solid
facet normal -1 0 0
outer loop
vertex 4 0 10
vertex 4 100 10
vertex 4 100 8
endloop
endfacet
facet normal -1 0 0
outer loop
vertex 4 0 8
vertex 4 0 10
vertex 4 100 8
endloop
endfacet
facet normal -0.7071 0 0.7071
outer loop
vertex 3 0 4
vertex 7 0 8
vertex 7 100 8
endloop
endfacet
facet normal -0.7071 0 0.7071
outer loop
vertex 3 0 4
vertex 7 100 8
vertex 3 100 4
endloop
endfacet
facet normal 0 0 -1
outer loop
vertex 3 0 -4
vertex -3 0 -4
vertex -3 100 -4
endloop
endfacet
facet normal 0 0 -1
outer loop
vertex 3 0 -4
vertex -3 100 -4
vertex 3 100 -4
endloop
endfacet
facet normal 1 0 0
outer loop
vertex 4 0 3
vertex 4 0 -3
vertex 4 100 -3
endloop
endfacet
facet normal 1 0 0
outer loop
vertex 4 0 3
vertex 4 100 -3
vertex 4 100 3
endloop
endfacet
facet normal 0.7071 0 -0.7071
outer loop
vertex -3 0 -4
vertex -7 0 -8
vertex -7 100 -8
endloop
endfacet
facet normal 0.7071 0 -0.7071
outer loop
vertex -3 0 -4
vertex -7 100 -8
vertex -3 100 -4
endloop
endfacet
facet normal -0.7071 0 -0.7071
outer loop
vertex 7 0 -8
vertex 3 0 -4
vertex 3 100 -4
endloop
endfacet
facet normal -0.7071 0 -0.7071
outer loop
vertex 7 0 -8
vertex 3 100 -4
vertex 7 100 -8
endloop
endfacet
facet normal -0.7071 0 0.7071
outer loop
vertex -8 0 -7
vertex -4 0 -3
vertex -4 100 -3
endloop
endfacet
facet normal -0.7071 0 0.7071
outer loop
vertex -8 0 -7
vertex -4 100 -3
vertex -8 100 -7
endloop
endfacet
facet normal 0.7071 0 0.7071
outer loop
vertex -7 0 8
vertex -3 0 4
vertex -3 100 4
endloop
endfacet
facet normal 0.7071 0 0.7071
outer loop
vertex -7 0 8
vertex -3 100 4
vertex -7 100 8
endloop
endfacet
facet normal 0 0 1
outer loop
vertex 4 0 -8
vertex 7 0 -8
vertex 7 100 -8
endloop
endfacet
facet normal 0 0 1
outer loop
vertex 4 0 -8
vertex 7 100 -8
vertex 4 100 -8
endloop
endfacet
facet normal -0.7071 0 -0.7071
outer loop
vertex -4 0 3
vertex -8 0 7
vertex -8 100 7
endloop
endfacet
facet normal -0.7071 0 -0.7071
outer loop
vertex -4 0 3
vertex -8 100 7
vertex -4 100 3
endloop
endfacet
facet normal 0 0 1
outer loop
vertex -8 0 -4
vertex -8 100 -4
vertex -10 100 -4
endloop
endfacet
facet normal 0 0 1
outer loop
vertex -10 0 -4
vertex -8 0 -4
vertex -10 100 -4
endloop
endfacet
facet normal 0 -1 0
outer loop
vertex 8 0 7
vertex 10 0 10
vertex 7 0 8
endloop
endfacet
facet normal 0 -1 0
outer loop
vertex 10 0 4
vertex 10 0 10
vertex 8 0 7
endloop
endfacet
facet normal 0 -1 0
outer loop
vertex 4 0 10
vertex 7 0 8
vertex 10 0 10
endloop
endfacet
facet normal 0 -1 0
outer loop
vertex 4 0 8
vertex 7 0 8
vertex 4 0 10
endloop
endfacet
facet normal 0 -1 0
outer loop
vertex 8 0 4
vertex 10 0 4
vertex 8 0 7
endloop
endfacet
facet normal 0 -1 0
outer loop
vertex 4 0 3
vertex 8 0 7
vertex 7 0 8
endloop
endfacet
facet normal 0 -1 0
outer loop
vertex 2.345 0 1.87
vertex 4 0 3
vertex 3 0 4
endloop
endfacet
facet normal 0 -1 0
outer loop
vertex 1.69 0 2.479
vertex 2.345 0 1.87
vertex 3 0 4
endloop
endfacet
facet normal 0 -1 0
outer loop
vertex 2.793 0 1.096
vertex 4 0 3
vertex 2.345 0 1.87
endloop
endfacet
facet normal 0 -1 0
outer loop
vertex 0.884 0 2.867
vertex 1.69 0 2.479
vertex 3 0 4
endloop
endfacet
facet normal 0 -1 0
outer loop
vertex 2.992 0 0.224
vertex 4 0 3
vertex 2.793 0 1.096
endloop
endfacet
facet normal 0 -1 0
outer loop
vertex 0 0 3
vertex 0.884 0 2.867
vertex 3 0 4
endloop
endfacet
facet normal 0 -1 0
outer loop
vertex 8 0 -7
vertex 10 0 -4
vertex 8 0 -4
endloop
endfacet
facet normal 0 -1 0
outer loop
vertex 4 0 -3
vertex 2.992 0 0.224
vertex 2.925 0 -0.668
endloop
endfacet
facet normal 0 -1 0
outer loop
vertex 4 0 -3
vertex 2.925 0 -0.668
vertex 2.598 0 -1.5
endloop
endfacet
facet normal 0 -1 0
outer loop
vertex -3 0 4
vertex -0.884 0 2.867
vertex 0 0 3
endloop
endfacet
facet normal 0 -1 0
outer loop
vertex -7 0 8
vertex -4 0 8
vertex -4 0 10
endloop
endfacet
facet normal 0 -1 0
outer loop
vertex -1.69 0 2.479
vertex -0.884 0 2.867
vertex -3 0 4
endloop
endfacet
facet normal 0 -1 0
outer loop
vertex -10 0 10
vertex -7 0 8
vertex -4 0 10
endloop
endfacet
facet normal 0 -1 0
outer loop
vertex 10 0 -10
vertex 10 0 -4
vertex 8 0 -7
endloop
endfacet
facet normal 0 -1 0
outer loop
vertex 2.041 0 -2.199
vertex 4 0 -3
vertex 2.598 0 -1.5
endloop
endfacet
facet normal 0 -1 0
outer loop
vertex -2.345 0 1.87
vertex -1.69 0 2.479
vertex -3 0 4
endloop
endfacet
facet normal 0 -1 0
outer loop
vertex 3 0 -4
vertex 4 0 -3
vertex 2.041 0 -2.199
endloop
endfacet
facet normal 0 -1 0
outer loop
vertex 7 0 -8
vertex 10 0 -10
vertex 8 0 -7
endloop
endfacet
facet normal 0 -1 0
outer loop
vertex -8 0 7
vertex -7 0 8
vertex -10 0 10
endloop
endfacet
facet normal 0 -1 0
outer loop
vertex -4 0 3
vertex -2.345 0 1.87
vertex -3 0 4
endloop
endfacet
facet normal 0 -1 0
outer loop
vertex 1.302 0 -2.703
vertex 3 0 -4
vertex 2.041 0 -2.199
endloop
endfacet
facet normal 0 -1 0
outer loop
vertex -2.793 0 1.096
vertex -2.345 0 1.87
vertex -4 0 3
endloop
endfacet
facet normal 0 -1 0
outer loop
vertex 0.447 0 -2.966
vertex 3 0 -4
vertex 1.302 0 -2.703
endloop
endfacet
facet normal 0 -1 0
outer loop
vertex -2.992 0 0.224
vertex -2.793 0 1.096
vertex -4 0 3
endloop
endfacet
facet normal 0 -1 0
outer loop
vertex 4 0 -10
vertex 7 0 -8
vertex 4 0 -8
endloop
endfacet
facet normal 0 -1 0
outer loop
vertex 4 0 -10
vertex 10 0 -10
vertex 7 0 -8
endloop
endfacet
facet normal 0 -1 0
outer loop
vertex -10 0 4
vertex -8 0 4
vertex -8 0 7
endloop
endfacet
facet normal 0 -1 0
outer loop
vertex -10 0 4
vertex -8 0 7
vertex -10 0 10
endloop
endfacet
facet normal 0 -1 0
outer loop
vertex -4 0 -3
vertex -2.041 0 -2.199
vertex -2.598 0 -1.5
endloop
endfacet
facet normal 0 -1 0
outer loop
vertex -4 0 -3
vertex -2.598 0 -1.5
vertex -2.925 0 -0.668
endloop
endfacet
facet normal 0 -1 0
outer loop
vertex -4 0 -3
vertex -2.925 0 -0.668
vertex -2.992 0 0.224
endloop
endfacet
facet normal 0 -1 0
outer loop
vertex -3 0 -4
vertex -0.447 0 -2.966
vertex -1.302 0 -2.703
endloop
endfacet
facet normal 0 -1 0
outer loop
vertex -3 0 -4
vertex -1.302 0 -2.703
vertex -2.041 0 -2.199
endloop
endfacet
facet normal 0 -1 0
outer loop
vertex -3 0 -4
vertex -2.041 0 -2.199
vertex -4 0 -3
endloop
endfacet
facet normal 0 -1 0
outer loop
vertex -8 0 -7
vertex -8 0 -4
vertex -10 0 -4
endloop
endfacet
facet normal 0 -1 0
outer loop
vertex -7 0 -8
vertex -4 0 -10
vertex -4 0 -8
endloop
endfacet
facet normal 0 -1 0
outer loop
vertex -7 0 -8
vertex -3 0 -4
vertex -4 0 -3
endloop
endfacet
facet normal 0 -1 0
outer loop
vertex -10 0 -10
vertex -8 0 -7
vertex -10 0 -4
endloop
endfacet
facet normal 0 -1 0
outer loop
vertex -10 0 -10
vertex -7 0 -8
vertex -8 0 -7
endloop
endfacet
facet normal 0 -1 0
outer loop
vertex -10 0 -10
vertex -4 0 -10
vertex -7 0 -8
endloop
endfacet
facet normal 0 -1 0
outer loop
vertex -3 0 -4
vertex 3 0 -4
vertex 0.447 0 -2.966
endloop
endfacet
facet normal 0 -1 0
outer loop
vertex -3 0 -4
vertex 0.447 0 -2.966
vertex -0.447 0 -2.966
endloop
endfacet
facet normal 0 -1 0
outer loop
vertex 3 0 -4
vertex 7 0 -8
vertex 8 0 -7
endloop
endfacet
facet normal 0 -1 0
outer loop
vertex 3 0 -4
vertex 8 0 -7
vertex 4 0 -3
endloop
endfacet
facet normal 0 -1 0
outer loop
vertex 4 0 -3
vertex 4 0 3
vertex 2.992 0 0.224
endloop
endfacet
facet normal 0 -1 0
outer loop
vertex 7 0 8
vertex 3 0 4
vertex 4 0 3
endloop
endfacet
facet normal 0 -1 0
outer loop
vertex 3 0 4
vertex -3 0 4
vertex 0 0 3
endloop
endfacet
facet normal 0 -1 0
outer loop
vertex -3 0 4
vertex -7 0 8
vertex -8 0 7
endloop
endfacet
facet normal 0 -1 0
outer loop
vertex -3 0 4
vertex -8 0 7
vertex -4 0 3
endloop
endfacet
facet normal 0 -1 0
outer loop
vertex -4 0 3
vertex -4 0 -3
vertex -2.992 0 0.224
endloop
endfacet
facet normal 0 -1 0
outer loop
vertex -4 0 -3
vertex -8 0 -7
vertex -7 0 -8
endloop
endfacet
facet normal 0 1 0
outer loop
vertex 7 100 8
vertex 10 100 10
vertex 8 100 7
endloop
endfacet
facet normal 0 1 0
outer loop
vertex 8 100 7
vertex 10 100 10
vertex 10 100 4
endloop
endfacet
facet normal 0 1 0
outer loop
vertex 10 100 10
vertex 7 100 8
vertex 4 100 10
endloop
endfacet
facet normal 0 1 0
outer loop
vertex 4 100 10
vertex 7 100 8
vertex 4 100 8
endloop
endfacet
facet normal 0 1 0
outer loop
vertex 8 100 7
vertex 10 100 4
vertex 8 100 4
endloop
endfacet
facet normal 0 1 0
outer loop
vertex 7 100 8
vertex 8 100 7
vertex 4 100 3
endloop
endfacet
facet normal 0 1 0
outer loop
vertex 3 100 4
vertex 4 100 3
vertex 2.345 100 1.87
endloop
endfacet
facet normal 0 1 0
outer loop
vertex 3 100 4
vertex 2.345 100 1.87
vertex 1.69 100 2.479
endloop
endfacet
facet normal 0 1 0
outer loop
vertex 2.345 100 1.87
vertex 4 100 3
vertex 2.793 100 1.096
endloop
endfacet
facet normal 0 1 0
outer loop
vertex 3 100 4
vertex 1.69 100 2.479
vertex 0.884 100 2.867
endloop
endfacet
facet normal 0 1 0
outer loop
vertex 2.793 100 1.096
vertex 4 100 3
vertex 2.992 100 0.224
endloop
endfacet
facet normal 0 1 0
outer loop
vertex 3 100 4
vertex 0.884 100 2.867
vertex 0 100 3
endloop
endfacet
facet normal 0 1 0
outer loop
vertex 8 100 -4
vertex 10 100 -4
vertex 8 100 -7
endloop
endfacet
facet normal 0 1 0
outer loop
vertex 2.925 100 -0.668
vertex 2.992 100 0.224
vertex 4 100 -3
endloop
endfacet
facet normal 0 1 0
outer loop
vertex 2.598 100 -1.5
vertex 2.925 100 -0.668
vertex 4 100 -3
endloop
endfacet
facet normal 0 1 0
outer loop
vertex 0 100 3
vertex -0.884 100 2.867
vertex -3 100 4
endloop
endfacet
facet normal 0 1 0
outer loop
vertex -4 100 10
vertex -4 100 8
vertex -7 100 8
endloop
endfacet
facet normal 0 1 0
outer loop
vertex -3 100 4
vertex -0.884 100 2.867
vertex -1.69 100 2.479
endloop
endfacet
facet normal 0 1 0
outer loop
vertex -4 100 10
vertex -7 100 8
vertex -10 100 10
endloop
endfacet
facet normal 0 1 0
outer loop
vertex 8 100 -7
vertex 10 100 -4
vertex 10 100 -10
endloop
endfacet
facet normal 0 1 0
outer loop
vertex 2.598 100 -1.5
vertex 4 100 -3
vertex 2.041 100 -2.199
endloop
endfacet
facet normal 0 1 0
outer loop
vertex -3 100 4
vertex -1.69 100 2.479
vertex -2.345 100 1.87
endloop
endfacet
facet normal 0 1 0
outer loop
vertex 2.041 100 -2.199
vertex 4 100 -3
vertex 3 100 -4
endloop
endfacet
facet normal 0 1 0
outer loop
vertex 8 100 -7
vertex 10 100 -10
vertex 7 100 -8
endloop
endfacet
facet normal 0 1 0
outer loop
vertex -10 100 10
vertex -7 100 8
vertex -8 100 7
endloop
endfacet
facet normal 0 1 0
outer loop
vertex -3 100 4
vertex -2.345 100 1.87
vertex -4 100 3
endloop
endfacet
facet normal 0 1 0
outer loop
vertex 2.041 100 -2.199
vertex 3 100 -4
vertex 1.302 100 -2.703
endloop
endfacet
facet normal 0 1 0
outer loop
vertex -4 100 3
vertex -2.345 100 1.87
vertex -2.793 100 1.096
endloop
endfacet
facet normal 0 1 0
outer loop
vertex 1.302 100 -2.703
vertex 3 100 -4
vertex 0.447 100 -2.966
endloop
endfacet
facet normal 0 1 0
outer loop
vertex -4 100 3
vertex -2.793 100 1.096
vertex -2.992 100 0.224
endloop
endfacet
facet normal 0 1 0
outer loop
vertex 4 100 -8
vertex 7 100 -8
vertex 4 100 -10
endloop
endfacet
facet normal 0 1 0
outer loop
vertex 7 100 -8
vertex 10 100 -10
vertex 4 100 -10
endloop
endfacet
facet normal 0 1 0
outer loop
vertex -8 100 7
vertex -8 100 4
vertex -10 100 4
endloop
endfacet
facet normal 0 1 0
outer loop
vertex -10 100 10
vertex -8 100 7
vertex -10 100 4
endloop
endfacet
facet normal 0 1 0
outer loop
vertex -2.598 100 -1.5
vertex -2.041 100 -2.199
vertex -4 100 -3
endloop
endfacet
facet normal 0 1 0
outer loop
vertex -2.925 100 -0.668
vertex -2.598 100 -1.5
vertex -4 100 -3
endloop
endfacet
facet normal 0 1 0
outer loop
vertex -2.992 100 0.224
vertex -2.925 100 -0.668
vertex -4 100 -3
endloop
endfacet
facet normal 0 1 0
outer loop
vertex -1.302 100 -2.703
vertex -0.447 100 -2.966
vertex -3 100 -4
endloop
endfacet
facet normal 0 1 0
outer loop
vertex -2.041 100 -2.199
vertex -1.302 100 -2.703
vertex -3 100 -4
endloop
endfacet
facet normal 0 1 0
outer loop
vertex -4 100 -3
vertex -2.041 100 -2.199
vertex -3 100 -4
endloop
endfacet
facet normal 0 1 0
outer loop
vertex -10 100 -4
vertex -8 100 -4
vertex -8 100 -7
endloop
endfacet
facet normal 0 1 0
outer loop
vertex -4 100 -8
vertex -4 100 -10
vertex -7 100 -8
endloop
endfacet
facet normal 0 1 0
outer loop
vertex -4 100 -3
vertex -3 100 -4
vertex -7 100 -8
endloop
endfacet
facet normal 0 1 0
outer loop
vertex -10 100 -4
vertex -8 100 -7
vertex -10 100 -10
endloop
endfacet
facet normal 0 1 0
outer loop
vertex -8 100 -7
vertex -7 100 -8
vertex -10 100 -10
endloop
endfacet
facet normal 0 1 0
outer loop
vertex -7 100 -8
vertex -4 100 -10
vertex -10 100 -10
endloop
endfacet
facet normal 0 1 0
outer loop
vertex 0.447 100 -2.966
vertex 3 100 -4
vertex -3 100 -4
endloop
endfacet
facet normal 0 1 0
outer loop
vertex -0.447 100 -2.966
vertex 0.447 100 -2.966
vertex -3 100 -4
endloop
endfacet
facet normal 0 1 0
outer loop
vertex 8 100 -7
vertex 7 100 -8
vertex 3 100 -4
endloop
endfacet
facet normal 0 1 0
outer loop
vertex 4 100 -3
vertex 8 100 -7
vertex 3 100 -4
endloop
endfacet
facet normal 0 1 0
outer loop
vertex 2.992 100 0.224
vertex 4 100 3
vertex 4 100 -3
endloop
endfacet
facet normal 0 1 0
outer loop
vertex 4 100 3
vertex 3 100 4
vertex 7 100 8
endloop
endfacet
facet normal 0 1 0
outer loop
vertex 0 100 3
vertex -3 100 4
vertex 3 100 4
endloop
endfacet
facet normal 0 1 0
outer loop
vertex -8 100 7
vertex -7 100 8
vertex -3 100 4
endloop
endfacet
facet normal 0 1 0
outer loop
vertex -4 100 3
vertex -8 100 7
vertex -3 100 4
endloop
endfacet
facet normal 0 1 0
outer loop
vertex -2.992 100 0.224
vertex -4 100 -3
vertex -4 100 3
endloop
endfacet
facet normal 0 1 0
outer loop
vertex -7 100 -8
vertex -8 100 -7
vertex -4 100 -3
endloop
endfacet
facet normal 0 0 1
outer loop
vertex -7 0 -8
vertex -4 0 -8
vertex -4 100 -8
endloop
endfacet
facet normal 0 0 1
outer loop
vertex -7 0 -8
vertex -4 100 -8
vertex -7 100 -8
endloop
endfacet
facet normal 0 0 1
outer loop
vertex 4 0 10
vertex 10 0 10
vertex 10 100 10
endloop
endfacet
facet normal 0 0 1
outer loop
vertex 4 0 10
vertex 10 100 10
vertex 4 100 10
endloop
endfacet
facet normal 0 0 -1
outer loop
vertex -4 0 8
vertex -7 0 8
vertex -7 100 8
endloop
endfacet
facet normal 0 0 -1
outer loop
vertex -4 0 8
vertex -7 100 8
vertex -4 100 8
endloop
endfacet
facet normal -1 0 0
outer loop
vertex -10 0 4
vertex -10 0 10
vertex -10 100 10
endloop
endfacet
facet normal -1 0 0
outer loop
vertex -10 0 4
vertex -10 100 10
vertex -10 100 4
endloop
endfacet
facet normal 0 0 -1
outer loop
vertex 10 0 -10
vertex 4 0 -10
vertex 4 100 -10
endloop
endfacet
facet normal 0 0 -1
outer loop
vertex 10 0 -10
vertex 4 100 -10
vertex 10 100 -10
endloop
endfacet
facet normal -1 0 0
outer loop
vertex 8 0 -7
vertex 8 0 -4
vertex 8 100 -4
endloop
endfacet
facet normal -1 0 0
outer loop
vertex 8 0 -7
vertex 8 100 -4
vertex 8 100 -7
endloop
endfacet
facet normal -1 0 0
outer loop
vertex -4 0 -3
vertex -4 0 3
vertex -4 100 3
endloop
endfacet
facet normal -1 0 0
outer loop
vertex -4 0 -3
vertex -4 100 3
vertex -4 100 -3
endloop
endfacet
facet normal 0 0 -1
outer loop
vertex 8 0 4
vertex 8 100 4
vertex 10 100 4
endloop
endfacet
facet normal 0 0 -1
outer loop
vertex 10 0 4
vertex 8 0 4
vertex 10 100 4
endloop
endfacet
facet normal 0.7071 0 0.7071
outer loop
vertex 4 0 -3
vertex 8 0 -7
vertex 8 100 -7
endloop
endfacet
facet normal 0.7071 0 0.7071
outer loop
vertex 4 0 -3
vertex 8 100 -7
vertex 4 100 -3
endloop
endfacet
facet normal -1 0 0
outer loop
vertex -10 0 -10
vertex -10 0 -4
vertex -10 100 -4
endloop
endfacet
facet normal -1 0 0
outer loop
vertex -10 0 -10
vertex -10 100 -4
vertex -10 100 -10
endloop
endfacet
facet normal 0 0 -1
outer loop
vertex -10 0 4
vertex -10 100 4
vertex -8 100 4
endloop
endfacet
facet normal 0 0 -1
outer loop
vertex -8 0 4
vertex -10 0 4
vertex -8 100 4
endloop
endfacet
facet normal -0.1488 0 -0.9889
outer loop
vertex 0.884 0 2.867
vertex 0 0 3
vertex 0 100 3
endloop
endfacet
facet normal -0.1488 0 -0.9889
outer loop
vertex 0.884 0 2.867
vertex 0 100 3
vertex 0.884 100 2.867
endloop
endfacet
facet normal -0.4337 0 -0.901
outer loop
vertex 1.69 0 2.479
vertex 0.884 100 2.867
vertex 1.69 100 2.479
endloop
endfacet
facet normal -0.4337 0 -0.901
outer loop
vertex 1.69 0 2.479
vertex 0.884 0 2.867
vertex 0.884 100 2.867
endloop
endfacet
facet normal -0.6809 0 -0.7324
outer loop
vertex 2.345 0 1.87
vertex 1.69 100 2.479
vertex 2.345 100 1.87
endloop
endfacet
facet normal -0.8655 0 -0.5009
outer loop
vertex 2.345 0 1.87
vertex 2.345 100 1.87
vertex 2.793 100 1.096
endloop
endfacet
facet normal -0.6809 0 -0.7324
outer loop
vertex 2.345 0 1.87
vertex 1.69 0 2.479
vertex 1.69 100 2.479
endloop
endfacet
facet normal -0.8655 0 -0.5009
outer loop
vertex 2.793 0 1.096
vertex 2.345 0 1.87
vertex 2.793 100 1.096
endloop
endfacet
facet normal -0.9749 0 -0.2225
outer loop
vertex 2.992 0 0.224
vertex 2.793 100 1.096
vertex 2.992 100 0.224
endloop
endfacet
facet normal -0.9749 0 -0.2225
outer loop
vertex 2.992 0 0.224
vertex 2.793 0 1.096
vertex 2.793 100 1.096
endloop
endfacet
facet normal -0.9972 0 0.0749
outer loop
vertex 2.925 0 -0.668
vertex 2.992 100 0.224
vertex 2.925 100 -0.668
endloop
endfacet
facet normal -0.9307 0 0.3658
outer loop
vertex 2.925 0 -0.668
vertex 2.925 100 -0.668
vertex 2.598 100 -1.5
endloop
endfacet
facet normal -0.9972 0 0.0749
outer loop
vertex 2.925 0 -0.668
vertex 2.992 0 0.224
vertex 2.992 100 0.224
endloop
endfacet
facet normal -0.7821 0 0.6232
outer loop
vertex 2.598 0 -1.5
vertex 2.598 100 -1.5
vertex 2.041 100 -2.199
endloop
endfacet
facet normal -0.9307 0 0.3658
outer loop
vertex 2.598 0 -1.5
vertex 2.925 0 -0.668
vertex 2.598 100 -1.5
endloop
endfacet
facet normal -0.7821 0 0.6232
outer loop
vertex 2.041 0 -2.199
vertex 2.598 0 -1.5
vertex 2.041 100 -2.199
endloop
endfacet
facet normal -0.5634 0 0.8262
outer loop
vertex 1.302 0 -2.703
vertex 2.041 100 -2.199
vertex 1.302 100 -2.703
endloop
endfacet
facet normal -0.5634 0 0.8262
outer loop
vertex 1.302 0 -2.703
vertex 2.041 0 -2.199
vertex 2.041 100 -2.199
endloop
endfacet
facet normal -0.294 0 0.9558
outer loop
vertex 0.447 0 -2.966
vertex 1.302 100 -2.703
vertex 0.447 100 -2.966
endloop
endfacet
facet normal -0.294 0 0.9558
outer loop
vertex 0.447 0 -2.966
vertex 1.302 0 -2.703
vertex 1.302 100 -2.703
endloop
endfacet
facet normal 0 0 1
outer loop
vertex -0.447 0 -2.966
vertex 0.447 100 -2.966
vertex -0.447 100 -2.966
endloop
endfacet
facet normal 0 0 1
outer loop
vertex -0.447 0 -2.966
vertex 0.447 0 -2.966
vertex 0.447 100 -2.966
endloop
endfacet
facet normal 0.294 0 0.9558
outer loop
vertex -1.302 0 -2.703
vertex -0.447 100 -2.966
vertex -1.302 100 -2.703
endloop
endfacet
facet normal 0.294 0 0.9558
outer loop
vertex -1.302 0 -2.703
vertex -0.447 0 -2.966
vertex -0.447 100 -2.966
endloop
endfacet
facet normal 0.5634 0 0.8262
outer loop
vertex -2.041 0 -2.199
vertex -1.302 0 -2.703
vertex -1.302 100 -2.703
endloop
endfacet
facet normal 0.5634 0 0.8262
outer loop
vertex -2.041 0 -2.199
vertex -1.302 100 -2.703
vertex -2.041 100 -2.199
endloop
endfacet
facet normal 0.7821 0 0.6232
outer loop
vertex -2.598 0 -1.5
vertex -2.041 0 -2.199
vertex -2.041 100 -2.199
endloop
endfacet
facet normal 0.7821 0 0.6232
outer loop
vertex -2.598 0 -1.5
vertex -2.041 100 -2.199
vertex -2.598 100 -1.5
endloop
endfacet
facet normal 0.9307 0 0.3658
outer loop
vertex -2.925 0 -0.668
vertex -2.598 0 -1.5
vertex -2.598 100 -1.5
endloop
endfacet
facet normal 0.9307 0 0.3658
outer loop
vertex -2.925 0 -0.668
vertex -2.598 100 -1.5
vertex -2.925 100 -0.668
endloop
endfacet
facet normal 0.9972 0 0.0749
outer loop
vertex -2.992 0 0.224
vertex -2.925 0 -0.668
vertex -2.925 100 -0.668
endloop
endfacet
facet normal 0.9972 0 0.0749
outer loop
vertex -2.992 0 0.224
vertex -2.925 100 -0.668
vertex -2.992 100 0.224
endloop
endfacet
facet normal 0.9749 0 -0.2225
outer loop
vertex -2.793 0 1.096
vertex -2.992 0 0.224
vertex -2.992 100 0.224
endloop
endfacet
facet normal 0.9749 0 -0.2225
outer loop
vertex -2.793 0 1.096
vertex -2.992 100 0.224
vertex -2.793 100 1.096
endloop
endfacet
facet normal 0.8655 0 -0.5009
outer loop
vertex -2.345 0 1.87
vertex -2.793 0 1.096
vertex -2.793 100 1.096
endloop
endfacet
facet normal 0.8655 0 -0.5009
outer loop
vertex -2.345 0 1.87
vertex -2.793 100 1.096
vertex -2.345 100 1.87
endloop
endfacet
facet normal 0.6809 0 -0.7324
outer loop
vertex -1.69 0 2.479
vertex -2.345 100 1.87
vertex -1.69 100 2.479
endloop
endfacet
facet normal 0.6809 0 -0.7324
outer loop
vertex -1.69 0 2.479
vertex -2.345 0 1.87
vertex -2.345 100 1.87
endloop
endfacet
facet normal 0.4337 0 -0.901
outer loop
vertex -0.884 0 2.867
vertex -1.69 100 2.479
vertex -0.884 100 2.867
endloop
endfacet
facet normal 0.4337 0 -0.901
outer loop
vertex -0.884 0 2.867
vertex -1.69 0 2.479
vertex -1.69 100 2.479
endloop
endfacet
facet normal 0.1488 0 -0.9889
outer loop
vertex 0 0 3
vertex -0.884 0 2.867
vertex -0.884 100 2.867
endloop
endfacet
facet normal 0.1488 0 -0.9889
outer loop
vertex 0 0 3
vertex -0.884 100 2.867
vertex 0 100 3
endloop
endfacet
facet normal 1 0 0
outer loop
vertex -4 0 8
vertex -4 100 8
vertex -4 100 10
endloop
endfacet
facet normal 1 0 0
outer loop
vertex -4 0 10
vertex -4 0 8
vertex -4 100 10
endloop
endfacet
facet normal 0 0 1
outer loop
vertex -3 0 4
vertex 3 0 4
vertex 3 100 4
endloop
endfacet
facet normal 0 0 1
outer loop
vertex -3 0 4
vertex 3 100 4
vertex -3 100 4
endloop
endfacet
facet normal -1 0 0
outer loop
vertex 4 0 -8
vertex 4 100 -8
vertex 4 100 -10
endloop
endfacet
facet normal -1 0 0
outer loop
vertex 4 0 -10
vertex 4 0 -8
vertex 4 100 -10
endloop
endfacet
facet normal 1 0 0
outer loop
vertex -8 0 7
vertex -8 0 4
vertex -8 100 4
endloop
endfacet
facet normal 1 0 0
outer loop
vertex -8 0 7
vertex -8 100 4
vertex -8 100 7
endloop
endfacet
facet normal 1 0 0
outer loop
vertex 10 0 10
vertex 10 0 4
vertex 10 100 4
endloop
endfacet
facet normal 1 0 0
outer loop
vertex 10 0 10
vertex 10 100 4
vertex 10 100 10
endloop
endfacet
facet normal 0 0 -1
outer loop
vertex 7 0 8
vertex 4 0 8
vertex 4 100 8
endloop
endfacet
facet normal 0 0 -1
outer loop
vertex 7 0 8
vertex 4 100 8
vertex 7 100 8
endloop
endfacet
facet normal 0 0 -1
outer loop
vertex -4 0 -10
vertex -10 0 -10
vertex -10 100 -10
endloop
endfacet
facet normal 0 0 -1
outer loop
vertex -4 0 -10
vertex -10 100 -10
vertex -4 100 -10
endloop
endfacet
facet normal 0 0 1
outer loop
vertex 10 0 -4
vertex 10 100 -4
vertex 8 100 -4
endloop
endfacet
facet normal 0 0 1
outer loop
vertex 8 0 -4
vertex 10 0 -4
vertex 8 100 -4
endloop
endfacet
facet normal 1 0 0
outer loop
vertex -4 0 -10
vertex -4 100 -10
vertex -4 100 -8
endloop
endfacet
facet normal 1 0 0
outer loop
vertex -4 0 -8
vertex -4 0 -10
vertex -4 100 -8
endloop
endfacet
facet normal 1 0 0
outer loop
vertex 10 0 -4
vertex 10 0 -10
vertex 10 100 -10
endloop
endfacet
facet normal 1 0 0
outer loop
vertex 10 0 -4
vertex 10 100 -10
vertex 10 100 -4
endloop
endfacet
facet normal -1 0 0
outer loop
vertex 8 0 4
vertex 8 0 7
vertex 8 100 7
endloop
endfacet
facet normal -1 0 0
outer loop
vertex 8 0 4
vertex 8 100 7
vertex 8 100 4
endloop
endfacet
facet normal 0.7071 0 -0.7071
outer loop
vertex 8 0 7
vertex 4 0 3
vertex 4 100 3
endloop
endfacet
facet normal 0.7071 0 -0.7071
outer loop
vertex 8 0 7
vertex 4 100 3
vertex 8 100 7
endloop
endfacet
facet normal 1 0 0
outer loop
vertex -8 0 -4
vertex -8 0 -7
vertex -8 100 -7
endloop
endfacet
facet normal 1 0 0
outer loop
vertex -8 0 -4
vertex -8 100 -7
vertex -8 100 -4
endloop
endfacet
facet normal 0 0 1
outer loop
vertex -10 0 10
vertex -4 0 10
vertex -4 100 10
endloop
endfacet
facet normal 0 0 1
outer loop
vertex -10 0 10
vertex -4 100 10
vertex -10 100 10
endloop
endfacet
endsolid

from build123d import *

# Parameters (mm, degrees)
F_2020_SKETCH_R     = 3
BOSS_EXTRUDE1_DEPTH = 100


with BuildPart() as part:
    # 2020 sketch → Boss-Extrude1 (new body)
    with BuildSketch(Plane(origin=(0, 0, 0), x_dir=(1, 0, 0), z_dir=(0, 1, 0))):
        Polygon((-4, 10), (-4, 8), (-7, 8), (-3, 4), (3, 4), (7, 8), (4, 8), (4, 10), (10, 10), (10, 4), (8, 4), (8, 7), (4, 3), (4, -3), (8, -7), (8, -4), (10, -4), (10, -10), (4, -10), (4, -8), (7, -8), (3, -4), (-3, -4), (-7, -8), (-4, -8), (-4, -10), (-10, -10), (-10, -4), (-8, -4), (-8, -7), (-4, -3), (-4, 3), (-8, 7), (-8, 4), (-10, 4), (-10, 10), align=None)
        with Locations(Location((0, 0, 0), (0, 0, 270))):
            Circle(F_2020_SKETCH_R, mode=Mode.SUBTRACT)
    extrude(amount=BOSS_EXTRUDE1_DEPTH)


solid = part.part
